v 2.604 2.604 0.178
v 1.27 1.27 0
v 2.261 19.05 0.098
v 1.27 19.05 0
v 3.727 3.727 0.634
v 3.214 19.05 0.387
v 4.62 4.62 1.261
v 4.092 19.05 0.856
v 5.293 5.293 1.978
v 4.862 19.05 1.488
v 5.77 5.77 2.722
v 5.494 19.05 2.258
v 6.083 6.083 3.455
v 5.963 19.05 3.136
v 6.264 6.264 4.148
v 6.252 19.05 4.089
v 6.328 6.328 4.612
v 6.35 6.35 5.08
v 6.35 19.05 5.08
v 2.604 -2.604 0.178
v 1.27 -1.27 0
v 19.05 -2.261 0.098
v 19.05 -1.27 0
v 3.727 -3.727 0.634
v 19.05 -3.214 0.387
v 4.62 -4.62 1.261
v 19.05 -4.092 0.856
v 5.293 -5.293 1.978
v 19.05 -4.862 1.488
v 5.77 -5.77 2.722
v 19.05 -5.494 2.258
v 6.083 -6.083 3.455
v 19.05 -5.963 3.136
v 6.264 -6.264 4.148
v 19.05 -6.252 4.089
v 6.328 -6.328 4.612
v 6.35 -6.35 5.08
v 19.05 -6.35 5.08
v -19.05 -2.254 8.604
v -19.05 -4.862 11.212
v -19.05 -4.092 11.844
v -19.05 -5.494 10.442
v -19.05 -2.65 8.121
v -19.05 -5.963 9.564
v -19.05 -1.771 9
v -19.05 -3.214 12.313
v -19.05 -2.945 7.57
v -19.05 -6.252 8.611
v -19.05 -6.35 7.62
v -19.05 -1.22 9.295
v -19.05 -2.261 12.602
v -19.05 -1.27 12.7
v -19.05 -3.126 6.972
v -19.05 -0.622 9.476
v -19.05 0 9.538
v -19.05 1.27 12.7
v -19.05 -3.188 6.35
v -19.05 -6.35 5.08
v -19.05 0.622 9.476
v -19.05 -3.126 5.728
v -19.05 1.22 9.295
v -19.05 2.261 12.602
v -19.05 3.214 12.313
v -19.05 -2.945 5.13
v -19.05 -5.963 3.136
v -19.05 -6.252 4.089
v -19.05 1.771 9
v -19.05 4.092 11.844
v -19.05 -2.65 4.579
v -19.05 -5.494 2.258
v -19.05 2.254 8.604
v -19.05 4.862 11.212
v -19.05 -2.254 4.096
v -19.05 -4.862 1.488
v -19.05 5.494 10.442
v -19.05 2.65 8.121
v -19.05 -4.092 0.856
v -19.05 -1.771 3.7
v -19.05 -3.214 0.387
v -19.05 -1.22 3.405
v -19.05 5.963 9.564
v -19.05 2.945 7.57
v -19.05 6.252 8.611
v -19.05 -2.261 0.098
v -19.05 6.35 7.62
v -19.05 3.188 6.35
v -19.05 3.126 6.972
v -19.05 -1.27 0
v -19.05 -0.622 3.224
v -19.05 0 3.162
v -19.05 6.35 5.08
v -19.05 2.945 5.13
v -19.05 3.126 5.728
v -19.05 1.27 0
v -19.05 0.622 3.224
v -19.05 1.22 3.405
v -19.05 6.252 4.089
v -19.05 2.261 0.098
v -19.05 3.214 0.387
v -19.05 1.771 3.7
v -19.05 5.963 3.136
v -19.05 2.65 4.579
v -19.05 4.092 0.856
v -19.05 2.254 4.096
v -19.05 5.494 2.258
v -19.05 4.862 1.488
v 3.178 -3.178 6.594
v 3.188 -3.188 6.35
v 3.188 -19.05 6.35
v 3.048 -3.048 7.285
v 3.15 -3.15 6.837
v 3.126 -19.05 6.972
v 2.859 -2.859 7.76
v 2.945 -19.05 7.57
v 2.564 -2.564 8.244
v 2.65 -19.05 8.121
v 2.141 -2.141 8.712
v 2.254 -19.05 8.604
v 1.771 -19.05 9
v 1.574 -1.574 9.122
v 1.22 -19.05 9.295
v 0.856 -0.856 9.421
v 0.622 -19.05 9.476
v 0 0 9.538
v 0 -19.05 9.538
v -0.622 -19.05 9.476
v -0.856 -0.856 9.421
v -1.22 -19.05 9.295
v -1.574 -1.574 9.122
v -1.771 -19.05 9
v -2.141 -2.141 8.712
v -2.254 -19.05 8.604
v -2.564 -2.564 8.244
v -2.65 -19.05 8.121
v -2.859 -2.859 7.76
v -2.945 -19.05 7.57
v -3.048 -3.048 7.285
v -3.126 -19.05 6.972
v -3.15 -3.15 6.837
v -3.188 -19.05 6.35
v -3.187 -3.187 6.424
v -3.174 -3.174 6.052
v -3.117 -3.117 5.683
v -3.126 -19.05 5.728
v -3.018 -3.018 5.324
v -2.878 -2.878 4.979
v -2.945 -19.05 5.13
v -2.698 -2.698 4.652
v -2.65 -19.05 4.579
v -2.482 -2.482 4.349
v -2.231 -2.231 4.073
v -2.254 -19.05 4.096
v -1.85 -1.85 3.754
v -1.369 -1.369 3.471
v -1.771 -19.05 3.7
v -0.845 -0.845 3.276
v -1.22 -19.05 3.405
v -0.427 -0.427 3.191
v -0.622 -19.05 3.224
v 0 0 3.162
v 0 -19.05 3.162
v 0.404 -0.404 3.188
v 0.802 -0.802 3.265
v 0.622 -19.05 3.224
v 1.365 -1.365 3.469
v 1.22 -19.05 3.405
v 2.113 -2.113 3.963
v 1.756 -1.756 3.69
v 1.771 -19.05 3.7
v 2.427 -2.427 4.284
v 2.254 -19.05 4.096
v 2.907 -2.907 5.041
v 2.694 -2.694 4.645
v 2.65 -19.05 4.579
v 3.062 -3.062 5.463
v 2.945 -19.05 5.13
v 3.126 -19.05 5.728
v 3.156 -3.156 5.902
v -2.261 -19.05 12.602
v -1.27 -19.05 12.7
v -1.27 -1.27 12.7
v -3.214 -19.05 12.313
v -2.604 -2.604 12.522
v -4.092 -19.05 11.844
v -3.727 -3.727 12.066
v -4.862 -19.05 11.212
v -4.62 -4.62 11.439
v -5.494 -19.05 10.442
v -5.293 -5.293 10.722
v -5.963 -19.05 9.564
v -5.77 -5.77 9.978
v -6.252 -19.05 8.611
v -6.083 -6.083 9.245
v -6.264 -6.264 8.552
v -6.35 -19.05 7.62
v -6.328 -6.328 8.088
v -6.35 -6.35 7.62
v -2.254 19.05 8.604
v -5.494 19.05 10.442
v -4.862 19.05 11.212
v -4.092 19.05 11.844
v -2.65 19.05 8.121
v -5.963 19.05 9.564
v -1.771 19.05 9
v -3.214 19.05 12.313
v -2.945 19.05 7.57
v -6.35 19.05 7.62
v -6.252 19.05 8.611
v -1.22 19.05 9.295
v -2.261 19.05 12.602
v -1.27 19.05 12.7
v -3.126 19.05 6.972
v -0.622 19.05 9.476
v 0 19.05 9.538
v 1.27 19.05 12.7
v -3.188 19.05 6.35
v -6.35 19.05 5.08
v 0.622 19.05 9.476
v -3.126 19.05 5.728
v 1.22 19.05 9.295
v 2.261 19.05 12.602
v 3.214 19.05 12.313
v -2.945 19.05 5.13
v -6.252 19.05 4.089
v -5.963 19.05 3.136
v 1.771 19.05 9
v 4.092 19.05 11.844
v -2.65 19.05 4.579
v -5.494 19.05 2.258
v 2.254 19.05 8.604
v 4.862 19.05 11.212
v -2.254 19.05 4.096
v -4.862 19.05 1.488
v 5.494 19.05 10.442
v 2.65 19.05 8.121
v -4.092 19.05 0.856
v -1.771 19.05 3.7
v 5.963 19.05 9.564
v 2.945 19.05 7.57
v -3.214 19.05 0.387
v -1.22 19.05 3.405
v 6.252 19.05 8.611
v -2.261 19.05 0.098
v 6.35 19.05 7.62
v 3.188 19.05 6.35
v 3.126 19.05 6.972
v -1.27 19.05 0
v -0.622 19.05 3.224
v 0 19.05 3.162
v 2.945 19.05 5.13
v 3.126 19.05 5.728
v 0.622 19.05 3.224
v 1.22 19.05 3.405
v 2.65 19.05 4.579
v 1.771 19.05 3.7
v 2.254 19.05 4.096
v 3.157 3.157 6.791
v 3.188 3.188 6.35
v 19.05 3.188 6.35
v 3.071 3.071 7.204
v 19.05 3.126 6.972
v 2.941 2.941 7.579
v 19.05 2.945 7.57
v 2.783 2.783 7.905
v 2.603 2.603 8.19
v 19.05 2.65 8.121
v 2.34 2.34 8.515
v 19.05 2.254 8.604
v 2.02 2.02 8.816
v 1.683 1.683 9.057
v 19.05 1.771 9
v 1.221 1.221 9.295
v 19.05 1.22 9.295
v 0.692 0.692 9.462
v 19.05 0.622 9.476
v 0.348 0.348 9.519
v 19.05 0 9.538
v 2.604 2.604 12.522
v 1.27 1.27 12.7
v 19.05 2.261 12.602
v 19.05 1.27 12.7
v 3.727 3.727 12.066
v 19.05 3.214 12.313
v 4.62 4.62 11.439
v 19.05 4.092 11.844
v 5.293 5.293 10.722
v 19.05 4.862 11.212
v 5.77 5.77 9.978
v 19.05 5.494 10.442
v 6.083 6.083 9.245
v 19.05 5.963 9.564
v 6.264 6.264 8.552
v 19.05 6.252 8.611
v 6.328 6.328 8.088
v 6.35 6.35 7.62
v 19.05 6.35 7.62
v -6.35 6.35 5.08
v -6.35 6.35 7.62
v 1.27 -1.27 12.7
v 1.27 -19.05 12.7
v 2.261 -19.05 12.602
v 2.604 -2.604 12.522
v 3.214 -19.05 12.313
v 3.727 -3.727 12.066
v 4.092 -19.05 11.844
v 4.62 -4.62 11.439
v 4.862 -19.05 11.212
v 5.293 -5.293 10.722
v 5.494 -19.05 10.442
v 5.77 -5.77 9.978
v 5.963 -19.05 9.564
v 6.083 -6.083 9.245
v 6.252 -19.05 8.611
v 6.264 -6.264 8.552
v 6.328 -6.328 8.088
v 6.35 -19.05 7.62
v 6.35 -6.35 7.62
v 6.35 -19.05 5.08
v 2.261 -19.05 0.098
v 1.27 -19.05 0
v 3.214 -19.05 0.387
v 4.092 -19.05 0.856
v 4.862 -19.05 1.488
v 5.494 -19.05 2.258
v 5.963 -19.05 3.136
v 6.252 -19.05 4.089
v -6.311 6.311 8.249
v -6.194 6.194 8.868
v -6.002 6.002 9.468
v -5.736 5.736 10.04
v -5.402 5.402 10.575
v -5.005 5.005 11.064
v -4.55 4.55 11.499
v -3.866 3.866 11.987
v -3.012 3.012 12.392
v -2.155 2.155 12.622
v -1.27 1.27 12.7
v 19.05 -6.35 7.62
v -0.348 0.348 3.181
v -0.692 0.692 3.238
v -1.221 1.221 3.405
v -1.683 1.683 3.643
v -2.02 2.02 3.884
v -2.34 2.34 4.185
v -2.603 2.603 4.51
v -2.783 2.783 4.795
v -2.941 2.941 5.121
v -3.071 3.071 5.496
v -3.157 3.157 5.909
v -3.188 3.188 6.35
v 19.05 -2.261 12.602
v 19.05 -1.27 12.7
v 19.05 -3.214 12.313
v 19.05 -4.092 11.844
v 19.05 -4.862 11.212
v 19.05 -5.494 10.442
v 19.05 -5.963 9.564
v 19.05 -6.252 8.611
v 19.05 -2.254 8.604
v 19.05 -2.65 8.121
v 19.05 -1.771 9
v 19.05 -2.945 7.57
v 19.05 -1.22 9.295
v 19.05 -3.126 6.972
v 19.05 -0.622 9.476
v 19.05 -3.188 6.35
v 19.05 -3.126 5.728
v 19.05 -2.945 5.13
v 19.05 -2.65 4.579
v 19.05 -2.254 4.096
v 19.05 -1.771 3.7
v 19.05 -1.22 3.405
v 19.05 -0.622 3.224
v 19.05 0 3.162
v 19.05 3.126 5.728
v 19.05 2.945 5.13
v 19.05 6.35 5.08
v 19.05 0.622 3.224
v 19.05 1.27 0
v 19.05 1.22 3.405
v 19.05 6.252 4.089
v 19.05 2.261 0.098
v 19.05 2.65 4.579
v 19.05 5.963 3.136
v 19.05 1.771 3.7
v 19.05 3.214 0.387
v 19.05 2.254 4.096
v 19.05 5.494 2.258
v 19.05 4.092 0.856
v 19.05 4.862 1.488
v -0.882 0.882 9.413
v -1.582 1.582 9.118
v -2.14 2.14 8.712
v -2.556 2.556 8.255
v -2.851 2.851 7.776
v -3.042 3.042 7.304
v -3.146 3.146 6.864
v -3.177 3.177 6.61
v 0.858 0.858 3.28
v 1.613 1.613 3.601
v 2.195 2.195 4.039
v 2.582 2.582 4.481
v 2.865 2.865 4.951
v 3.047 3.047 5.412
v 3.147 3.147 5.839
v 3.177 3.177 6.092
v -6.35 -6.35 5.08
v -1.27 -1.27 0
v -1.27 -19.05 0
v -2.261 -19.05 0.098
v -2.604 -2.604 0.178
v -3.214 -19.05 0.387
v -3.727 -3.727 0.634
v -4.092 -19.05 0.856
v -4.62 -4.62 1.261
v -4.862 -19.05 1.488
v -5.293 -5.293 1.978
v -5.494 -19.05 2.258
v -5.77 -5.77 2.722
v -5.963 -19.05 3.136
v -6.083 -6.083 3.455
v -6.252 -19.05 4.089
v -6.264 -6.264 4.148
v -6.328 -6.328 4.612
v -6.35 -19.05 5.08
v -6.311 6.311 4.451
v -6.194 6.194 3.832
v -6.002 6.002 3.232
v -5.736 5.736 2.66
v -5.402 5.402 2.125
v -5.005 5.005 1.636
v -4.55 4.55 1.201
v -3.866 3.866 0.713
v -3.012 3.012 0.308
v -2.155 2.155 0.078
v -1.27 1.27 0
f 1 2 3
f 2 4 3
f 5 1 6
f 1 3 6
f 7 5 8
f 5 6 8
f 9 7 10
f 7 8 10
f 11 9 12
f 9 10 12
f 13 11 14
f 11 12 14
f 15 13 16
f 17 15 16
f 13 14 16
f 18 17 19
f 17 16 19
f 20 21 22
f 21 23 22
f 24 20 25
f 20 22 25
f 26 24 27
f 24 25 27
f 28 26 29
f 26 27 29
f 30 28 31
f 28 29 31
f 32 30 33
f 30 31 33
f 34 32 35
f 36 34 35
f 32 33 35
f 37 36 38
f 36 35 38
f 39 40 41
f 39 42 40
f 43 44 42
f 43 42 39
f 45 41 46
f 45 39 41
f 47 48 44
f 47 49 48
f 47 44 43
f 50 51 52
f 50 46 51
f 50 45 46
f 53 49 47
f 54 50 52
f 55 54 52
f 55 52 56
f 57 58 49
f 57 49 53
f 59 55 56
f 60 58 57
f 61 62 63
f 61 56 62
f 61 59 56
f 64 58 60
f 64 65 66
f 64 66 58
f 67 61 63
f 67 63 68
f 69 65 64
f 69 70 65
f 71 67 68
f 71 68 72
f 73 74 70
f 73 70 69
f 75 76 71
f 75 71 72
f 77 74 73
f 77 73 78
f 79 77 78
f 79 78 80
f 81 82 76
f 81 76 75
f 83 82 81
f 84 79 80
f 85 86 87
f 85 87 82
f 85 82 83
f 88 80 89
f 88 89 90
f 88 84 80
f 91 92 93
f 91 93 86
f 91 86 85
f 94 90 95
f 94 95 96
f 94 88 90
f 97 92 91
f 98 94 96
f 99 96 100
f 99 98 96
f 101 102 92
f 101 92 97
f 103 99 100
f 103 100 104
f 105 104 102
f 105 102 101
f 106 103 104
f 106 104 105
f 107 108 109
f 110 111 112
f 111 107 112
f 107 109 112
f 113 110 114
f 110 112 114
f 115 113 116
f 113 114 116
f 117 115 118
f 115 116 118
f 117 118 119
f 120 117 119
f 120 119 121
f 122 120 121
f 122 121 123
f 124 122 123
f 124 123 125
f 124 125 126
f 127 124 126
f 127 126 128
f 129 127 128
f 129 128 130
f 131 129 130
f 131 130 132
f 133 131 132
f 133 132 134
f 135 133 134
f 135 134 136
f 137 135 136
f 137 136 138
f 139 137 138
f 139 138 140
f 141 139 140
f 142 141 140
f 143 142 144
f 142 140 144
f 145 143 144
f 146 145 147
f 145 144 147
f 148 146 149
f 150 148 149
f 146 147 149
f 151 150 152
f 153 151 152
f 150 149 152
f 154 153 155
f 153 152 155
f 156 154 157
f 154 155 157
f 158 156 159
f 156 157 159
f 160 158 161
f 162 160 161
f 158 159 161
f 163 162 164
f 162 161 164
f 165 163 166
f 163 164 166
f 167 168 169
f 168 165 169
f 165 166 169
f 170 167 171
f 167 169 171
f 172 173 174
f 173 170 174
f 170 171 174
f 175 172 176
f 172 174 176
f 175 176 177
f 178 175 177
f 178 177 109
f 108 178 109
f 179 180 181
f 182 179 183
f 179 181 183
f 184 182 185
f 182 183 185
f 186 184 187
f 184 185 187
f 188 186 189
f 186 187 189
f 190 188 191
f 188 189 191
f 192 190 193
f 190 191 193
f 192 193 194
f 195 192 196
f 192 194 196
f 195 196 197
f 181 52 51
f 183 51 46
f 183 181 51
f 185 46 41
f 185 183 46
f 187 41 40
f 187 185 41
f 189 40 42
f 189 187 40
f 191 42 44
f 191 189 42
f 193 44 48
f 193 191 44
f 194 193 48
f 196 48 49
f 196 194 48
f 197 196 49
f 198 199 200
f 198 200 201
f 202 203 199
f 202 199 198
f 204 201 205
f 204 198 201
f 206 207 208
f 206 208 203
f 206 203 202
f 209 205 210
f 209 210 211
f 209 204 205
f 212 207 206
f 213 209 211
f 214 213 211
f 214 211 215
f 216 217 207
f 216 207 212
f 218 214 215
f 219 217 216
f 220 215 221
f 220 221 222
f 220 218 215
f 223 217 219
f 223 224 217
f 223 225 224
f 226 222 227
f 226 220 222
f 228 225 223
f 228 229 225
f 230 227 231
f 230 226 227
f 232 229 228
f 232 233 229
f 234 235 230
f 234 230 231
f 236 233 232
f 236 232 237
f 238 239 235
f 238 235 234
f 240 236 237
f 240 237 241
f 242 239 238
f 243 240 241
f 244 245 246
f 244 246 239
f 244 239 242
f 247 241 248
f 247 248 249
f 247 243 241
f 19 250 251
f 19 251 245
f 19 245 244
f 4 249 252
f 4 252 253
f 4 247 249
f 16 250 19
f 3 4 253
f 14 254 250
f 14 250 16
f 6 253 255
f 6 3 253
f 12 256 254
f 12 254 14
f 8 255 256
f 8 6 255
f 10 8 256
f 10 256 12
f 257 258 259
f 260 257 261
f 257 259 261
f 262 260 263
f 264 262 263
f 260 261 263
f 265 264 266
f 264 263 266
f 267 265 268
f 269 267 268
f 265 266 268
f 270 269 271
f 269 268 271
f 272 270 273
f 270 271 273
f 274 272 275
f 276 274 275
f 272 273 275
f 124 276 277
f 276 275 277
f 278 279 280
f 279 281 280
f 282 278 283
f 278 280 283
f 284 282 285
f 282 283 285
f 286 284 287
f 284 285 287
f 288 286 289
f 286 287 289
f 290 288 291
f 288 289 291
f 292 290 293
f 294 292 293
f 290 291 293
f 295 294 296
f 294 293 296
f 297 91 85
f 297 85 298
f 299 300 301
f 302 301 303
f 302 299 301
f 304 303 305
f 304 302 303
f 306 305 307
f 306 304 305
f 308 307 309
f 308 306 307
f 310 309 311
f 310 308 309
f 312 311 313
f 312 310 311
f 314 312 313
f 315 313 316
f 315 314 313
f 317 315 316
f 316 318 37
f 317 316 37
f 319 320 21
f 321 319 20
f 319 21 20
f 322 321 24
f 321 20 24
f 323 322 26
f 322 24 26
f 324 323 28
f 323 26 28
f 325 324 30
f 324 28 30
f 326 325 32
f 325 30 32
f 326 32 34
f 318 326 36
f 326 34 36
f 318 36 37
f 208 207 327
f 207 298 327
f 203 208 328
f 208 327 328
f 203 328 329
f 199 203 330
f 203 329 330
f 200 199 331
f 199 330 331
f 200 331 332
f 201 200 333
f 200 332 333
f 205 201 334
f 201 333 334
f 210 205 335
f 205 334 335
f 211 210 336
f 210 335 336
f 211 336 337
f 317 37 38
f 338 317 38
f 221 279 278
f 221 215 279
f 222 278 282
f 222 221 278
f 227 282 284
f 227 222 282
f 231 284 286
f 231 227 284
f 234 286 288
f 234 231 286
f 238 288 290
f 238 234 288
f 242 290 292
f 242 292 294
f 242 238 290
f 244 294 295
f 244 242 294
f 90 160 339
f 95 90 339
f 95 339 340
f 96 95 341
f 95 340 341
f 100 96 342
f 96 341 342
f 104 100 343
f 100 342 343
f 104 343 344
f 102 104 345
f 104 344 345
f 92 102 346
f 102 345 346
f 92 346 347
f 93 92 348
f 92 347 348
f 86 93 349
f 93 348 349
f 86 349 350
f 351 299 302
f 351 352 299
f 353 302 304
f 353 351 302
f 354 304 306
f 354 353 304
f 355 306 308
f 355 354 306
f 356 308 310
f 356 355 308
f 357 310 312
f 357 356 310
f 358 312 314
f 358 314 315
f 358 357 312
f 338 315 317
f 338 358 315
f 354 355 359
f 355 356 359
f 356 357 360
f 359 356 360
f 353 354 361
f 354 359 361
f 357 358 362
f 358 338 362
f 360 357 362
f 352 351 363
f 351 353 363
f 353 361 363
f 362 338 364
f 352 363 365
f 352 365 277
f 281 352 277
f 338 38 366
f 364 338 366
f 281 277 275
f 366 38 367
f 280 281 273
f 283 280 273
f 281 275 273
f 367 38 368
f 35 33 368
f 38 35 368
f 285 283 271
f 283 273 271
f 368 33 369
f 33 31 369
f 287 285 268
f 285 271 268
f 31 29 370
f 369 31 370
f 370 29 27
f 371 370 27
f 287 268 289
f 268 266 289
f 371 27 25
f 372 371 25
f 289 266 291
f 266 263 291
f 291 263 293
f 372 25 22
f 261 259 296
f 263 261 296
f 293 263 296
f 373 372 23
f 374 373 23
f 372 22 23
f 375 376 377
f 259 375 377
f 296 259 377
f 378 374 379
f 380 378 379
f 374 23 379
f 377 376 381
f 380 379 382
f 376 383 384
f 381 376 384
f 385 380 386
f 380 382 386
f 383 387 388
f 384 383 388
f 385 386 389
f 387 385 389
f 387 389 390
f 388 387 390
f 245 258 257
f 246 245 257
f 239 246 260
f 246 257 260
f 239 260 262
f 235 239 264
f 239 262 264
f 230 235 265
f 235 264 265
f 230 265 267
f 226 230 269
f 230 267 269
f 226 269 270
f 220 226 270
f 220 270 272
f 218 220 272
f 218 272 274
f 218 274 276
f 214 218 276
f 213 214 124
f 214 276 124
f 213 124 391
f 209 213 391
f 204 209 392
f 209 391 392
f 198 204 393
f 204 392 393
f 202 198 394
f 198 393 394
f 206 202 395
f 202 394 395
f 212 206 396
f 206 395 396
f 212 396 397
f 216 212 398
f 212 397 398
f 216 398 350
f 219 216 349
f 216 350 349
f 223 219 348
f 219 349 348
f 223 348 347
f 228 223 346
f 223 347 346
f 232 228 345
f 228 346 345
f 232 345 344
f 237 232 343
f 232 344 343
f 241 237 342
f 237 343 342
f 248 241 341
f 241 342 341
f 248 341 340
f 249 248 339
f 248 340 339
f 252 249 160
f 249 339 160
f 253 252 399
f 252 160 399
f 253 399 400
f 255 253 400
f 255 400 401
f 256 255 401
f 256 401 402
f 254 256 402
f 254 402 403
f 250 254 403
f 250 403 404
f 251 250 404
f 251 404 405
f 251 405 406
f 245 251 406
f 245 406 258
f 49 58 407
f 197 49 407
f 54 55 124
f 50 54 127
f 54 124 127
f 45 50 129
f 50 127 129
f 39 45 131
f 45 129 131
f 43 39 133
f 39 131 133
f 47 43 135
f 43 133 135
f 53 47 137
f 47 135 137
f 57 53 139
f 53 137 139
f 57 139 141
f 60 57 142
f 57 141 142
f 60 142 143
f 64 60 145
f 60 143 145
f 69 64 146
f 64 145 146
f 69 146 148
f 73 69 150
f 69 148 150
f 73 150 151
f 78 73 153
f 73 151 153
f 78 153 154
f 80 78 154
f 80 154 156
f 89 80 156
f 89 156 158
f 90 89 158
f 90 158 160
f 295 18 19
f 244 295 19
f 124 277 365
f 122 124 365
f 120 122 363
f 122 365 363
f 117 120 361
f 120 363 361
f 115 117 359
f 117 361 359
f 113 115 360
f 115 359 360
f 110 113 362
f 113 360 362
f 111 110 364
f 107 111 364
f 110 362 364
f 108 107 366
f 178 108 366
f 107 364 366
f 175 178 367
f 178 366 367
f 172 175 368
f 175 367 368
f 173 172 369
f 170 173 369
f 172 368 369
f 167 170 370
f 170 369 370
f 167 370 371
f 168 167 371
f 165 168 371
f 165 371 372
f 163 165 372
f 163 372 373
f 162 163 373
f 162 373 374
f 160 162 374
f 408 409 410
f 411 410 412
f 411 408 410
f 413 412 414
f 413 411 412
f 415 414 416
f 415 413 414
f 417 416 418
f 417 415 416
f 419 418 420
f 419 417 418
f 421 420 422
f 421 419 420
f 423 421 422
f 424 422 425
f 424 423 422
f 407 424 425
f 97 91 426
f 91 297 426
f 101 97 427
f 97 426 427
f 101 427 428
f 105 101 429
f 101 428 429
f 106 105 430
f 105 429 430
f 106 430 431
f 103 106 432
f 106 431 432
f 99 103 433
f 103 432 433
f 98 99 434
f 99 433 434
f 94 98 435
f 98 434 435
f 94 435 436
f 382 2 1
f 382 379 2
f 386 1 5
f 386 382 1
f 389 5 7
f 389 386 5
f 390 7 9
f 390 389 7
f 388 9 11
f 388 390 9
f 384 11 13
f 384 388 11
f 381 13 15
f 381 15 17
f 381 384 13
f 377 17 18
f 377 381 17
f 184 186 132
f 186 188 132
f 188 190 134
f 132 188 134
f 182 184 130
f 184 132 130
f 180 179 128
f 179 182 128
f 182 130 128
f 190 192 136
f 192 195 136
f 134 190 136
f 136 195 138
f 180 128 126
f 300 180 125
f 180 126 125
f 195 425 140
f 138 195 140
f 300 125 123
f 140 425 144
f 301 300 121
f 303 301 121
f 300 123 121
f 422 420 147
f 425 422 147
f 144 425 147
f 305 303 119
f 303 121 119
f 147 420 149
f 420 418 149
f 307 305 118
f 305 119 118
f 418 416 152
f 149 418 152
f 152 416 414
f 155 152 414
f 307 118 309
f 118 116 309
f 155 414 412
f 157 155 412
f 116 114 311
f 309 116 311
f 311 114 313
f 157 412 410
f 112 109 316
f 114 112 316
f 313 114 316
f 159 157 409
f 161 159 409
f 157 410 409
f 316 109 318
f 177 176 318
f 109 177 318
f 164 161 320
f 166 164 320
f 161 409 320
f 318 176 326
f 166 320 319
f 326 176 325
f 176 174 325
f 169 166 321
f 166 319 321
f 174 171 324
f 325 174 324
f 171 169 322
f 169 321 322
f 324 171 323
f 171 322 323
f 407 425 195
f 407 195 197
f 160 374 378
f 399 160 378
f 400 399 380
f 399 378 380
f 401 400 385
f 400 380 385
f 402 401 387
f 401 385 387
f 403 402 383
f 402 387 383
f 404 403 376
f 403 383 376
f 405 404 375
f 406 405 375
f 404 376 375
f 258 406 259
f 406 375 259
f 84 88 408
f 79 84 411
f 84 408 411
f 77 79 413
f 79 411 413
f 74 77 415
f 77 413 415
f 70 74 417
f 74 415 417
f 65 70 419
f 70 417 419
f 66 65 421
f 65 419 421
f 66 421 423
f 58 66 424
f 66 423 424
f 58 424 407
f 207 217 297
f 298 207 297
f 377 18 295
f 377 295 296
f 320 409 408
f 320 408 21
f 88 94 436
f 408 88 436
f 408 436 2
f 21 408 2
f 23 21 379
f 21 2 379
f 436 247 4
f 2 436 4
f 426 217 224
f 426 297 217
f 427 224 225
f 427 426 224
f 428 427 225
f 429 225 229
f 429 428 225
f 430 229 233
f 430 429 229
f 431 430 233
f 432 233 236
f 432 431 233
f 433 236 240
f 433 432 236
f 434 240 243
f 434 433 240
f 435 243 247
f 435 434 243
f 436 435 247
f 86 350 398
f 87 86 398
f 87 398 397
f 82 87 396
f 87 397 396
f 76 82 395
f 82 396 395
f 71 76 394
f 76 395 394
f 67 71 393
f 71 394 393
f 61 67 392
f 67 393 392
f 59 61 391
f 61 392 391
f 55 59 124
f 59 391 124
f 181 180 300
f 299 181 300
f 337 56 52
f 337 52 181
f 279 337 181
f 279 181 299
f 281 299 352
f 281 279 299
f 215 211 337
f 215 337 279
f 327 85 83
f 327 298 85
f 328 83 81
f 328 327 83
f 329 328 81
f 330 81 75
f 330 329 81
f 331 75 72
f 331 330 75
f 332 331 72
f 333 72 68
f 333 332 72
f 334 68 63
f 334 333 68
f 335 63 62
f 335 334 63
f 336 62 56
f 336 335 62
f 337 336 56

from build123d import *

# Parameters (mm, degrees)
F0_W     = 12.7
F0_H     = 12.7
F1_DEPTH = 12.7
F4_DEPTH = 50.8
F3_R     = 3.1877
F5_DEPTH = 76.2
F6_R     = 5.08


with BuildPart() as f1:
    # F0 (on Top) → F1 (new body)
    with BuildSketch(Plane.XY):
        with Locations((0, 12.7)):
            Rectangle(F0_W, F0_H)
        with Locations((12.7, 0)):
            Rectangle(F0_W, F0_H)
        Rectangle(F0_W, F0_H)
        with Locations((-12.7, 0)):
            Rectangle(F0_W, F0_H)
        with Locations((0, -12.7)):
            Rectangle(F0_W, F0_H)
    extrude(amount=F1_DEPTH)

    # F2 (on face) → F4 (cut)
    with BuildSketch(Plane.YZ.offset(19.05)):
        with BuildLine():
            Line((0, 3.1623), (0, 9.5377))
            ThreePointArc((0, 9.5377), (-3.1877, 6.35), (0, 3.1623))
        make_face()
        with BuildLine():
            ThreePointArc((3.1877, 6.35), (2.2540442864, 8.6040442864), (0, 9.5377))
            Line((0, 9.5377), (0, 3.1623))
            ThreePointArc((0, 3.1623), (2.2540442864, 4.0959557136), (3.1877, 6.35))
        make_face()
    extrude(amount=-F4_DEPTH, mode=Mode.SUBTRACT)

    # F3 (on face) → F5 (cut)
    with BuildSketch(Plane.XZ.offset(19.05)):
        with Locations((0, 6.35)):
            Circle(F3_R)
    extrude(amount=-F5_DEPTH, mode=Mode.SUBTRACT)

    # F6
    f6_edges = [f1.edges().sort_by_distance(p)[0] for p in [
        (-6.35, -12.7, 0),
        (6.35, -12.7, 0),
        (12.7, -6.35, 0),
        (12.7, 6.35, 0),
        (6.35, 12.7, 0),
        (-6.35, 12.7, 0),
        (-12.7, -6.35, 0),
        (-12.7, 6.35, 0),
        (-12.7, -6.35, 12.7),
        (-6.35, -12.7, 12.7),
        (12.7, -6.35, 12.7),
        (-12.7, 6.35, 12.7),
        (-6.35, 12.7, 12.7),
        (6.35, 12.7, 12.7),
        (6.35, -12.7, 12.7),
        (12.7, 6.35, 12.7),
    ]]
    fillet(f6_edges, radius=F6_R)


solid = f1.part
